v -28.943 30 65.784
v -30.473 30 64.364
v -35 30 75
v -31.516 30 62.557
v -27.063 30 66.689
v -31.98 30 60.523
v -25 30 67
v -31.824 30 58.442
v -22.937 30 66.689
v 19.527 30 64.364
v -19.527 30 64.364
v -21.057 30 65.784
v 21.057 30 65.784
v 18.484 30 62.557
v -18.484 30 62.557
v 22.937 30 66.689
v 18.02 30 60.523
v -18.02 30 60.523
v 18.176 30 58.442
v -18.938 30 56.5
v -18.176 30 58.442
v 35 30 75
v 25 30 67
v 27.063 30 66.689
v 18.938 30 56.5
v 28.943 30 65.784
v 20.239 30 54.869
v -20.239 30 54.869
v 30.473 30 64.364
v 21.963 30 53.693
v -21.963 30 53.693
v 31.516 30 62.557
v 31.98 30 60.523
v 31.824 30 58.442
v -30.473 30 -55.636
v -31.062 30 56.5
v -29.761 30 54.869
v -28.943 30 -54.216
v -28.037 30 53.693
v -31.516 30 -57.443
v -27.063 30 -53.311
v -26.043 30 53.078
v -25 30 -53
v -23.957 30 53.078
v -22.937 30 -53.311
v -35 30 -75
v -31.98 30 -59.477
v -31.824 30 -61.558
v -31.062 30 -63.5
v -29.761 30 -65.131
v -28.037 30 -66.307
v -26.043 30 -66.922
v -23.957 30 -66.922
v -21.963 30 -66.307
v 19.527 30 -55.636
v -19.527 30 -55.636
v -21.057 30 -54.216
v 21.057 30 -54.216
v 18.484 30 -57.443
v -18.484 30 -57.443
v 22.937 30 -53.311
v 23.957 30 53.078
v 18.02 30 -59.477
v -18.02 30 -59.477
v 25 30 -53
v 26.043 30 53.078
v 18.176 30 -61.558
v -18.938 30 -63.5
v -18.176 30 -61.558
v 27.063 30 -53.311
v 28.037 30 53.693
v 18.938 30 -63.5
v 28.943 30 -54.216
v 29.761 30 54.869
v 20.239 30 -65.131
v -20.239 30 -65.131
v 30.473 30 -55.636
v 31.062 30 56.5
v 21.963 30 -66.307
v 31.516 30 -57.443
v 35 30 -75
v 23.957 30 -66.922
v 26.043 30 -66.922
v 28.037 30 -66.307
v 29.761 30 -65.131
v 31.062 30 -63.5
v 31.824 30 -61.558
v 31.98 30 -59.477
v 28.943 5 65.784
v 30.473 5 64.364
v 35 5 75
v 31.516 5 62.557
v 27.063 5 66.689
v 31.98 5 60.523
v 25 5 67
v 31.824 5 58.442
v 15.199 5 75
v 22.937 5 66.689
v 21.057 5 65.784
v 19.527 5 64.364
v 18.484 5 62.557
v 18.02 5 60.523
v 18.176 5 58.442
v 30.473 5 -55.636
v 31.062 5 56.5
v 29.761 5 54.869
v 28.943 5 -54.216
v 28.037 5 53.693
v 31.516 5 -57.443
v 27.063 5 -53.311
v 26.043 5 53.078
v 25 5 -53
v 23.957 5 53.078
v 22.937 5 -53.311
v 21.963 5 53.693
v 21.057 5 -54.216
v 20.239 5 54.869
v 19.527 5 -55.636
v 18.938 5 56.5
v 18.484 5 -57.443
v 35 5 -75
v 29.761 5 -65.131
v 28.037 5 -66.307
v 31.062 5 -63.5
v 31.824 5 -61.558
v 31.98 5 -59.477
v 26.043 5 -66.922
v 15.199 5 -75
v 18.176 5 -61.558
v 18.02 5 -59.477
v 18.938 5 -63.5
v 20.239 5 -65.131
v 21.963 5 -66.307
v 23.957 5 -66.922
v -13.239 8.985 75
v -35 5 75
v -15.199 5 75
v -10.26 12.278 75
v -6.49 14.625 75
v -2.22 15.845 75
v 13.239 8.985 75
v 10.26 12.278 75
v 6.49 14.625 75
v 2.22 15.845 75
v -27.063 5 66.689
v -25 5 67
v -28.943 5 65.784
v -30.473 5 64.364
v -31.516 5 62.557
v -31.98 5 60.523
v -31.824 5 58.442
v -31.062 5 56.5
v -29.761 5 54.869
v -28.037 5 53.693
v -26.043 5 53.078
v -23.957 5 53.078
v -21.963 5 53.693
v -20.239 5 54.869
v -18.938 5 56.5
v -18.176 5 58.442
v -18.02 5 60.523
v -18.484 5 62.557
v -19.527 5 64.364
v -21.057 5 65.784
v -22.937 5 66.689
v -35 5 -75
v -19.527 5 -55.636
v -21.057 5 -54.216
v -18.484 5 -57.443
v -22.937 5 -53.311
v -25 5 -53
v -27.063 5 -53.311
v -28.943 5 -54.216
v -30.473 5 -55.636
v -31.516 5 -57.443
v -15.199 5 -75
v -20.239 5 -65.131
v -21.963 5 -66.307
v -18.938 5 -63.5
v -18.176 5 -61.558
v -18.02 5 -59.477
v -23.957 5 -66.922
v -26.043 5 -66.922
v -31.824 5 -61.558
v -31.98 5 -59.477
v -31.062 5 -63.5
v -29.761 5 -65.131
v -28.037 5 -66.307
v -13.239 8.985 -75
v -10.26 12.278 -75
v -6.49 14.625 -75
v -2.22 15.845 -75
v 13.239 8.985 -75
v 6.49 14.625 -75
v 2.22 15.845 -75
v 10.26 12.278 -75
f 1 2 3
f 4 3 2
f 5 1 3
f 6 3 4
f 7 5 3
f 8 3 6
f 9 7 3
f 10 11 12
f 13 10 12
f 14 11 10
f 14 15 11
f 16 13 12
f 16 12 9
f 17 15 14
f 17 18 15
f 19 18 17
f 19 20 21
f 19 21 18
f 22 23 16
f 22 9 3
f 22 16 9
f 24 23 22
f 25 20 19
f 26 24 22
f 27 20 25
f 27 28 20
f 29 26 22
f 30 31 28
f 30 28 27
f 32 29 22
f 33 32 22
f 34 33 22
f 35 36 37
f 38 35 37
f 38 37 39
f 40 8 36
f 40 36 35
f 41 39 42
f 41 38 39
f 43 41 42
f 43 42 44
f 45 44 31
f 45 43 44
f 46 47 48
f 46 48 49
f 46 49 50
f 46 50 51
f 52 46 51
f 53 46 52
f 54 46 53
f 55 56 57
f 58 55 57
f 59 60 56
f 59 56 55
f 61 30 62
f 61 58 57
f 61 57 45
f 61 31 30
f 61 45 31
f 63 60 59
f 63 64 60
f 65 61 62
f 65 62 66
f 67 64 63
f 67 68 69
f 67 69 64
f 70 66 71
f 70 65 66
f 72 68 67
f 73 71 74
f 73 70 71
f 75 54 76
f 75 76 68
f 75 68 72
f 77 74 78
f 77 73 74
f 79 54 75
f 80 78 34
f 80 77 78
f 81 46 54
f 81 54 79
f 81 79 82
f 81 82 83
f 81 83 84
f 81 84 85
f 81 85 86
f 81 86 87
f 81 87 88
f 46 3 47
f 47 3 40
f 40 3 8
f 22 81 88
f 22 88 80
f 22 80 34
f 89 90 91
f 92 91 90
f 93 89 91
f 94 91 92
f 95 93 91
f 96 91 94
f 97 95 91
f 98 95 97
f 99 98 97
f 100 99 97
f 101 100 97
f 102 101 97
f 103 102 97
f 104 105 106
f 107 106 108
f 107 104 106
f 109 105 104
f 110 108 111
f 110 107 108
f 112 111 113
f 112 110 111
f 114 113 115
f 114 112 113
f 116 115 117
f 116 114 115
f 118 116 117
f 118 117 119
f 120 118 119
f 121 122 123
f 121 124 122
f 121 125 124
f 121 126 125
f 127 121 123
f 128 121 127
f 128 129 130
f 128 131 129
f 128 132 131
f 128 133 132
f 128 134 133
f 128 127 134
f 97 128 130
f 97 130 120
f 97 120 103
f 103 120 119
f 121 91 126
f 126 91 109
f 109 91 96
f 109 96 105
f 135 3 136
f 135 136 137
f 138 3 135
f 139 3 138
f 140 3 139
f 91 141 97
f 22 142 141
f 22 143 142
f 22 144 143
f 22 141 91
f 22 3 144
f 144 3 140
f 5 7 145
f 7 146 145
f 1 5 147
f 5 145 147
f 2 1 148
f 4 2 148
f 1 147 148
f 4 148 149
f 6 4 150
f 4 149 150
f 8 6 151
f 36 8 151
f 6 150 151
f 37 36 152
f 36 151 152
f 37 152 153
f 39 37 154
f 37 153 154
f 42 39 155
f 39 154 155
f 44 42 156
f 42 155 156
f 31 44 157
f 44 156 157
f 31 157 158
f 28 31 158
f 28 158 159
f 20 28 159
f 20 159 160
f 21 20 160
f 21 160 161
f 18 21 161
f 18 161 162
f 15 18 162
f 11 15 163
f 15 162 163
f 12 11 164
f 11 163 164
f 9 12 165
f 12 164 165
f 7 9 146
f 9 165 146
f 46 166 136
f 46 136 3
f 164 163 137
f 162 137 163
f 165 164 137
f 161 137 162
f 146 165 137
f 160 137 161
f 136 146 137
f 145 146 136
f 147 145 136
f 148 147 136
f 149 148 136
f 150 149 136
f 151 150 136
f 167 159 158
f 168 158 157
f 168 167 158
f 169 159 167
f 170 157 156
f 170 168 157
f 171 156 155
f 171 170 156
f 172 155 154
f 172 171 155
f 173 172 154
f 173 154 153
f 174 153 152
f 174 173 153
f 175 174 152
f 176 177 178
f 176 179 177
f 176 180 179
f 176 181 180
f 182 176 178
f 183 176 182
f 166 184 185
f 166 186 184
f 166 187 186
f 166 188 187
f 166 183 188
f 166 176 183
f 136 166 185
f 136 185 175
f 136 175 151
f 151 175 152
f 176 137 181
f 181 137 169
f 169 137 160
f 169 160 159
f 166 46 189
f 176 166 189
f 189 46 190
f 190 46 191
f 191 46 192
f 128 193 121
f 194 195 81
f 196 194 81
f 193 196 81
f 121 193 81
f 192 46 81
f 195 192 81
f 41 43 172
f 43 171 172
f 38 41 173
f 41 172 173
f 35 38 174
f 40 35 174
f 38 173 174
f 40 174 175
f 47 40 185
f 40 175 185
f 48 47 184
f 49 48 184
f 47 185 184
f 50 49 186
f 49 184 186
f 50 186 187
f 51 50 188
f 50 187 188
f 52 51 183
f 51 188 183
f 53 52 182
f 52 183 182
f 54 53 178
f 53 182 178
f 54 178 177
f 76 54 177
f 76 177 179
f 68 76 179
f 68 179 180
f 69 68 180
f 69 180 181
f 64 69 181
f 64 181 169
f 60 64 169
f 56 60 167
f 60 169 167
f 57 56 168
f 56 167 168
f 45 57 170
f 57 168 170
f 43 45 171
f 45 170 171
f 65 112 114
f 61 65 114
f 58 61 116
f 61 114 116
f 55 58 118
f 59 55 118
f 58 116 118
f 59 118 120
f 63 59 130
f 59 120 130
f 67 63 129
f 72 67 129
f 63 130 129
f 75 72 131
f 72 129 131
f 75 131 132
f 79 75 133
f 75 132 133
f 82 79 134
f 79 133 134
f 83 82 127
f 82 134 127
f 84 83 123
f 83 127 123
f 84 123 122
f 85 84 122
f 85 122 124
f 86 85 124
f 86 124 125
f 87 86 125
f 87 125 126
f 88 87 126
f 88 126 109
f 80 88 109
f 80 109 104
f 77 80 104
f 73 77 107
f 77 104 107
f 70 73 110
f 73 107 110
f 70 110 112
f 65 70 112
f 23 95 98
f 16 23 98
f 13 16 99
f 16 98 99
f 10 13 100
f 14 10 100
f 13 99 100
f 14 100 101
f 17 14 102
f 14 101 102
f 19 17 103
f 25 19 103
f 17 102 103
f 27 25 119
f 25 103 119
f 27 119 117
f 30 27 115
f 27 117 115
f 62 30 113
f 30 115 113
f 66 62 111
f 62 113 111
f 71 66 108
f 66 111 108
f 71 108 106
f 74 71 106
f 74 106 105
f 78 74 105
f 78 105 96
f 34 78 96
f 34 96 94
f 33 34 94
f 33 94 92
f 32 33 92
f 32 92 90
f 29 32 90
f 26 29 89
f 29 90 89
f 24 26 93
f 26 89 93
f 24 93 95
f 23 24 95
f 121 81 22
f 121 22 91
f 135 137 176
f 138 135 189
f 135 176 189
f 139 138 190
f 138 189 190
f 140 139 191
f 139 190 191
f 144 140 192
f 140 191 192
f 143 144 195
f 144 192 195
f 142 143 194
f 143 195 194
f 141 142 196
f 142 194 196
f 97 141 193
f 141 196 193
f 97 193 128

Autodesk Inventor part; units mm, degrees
ref_plane "YZ Plane" through (0, 0, 0) normal (1, 0, 0) x (0, 1, 0)
ref_plane "XZ Plane" through (0, 0, 0) normal (0, 1, 0) x (-1, 0, 0)
ref_plane "XY Plane" through (0, 0, 0) normal (0, 0, 1) x (1, 0, 0)
sketch "Sketch1" plane through (0, 0, 0) normal (0, 0, 1) x (1, 0, 0)
  arc A0 (15.1987, 5) -> (-15.1987, 5) centre (0, 0) ccw
  line L0 (-15.1987, 5) -> (-35, 5)
  line L1 (-35, 5) -> (-35, 30)
  line L2 (-35, 30) -> (35, 30)
  line L3 (35, 30) -> (35, 5)
  line L4 (35, 5) -> (15.1987, 5)
  line L5 (0, 0) -> (0, 30)
  dimension "d0" = 32
  dimension "d1" = 70
  dimension "d2" = 5
  dimension "d3" = 19.8013
  dimension "d4" = 25
extrude "Extrusion1" add sketch "Sketch1" along normal mid plane 150
sketch "Sketch2" plane through (-35, 30, 75) normal (0, 1, 0) x (1, 0, 0)
  line L0 (0, 150) -> (70, 150) construction
  line L1 (0, 150) -> (0, 0) construction
  line L2 (35, 75) -> (70, 75)
  line L3 (35, 75) -> (35, 150)
  point P0 (10, 135)
  point P1 (60, 135)
  point P2 (10, 15)
  point P3 (60, 15)
  dimension "d7" = 15
  dimension "d8" = 10
hole "Hole1" at (-25, 30, -60) at (25, 30, -60) at (-25, 30, 60) at (25, 30, 60) direction (0, -1, 0) diameter 14 end through all
properties part number "Suspension_Clamp_Cunha"
